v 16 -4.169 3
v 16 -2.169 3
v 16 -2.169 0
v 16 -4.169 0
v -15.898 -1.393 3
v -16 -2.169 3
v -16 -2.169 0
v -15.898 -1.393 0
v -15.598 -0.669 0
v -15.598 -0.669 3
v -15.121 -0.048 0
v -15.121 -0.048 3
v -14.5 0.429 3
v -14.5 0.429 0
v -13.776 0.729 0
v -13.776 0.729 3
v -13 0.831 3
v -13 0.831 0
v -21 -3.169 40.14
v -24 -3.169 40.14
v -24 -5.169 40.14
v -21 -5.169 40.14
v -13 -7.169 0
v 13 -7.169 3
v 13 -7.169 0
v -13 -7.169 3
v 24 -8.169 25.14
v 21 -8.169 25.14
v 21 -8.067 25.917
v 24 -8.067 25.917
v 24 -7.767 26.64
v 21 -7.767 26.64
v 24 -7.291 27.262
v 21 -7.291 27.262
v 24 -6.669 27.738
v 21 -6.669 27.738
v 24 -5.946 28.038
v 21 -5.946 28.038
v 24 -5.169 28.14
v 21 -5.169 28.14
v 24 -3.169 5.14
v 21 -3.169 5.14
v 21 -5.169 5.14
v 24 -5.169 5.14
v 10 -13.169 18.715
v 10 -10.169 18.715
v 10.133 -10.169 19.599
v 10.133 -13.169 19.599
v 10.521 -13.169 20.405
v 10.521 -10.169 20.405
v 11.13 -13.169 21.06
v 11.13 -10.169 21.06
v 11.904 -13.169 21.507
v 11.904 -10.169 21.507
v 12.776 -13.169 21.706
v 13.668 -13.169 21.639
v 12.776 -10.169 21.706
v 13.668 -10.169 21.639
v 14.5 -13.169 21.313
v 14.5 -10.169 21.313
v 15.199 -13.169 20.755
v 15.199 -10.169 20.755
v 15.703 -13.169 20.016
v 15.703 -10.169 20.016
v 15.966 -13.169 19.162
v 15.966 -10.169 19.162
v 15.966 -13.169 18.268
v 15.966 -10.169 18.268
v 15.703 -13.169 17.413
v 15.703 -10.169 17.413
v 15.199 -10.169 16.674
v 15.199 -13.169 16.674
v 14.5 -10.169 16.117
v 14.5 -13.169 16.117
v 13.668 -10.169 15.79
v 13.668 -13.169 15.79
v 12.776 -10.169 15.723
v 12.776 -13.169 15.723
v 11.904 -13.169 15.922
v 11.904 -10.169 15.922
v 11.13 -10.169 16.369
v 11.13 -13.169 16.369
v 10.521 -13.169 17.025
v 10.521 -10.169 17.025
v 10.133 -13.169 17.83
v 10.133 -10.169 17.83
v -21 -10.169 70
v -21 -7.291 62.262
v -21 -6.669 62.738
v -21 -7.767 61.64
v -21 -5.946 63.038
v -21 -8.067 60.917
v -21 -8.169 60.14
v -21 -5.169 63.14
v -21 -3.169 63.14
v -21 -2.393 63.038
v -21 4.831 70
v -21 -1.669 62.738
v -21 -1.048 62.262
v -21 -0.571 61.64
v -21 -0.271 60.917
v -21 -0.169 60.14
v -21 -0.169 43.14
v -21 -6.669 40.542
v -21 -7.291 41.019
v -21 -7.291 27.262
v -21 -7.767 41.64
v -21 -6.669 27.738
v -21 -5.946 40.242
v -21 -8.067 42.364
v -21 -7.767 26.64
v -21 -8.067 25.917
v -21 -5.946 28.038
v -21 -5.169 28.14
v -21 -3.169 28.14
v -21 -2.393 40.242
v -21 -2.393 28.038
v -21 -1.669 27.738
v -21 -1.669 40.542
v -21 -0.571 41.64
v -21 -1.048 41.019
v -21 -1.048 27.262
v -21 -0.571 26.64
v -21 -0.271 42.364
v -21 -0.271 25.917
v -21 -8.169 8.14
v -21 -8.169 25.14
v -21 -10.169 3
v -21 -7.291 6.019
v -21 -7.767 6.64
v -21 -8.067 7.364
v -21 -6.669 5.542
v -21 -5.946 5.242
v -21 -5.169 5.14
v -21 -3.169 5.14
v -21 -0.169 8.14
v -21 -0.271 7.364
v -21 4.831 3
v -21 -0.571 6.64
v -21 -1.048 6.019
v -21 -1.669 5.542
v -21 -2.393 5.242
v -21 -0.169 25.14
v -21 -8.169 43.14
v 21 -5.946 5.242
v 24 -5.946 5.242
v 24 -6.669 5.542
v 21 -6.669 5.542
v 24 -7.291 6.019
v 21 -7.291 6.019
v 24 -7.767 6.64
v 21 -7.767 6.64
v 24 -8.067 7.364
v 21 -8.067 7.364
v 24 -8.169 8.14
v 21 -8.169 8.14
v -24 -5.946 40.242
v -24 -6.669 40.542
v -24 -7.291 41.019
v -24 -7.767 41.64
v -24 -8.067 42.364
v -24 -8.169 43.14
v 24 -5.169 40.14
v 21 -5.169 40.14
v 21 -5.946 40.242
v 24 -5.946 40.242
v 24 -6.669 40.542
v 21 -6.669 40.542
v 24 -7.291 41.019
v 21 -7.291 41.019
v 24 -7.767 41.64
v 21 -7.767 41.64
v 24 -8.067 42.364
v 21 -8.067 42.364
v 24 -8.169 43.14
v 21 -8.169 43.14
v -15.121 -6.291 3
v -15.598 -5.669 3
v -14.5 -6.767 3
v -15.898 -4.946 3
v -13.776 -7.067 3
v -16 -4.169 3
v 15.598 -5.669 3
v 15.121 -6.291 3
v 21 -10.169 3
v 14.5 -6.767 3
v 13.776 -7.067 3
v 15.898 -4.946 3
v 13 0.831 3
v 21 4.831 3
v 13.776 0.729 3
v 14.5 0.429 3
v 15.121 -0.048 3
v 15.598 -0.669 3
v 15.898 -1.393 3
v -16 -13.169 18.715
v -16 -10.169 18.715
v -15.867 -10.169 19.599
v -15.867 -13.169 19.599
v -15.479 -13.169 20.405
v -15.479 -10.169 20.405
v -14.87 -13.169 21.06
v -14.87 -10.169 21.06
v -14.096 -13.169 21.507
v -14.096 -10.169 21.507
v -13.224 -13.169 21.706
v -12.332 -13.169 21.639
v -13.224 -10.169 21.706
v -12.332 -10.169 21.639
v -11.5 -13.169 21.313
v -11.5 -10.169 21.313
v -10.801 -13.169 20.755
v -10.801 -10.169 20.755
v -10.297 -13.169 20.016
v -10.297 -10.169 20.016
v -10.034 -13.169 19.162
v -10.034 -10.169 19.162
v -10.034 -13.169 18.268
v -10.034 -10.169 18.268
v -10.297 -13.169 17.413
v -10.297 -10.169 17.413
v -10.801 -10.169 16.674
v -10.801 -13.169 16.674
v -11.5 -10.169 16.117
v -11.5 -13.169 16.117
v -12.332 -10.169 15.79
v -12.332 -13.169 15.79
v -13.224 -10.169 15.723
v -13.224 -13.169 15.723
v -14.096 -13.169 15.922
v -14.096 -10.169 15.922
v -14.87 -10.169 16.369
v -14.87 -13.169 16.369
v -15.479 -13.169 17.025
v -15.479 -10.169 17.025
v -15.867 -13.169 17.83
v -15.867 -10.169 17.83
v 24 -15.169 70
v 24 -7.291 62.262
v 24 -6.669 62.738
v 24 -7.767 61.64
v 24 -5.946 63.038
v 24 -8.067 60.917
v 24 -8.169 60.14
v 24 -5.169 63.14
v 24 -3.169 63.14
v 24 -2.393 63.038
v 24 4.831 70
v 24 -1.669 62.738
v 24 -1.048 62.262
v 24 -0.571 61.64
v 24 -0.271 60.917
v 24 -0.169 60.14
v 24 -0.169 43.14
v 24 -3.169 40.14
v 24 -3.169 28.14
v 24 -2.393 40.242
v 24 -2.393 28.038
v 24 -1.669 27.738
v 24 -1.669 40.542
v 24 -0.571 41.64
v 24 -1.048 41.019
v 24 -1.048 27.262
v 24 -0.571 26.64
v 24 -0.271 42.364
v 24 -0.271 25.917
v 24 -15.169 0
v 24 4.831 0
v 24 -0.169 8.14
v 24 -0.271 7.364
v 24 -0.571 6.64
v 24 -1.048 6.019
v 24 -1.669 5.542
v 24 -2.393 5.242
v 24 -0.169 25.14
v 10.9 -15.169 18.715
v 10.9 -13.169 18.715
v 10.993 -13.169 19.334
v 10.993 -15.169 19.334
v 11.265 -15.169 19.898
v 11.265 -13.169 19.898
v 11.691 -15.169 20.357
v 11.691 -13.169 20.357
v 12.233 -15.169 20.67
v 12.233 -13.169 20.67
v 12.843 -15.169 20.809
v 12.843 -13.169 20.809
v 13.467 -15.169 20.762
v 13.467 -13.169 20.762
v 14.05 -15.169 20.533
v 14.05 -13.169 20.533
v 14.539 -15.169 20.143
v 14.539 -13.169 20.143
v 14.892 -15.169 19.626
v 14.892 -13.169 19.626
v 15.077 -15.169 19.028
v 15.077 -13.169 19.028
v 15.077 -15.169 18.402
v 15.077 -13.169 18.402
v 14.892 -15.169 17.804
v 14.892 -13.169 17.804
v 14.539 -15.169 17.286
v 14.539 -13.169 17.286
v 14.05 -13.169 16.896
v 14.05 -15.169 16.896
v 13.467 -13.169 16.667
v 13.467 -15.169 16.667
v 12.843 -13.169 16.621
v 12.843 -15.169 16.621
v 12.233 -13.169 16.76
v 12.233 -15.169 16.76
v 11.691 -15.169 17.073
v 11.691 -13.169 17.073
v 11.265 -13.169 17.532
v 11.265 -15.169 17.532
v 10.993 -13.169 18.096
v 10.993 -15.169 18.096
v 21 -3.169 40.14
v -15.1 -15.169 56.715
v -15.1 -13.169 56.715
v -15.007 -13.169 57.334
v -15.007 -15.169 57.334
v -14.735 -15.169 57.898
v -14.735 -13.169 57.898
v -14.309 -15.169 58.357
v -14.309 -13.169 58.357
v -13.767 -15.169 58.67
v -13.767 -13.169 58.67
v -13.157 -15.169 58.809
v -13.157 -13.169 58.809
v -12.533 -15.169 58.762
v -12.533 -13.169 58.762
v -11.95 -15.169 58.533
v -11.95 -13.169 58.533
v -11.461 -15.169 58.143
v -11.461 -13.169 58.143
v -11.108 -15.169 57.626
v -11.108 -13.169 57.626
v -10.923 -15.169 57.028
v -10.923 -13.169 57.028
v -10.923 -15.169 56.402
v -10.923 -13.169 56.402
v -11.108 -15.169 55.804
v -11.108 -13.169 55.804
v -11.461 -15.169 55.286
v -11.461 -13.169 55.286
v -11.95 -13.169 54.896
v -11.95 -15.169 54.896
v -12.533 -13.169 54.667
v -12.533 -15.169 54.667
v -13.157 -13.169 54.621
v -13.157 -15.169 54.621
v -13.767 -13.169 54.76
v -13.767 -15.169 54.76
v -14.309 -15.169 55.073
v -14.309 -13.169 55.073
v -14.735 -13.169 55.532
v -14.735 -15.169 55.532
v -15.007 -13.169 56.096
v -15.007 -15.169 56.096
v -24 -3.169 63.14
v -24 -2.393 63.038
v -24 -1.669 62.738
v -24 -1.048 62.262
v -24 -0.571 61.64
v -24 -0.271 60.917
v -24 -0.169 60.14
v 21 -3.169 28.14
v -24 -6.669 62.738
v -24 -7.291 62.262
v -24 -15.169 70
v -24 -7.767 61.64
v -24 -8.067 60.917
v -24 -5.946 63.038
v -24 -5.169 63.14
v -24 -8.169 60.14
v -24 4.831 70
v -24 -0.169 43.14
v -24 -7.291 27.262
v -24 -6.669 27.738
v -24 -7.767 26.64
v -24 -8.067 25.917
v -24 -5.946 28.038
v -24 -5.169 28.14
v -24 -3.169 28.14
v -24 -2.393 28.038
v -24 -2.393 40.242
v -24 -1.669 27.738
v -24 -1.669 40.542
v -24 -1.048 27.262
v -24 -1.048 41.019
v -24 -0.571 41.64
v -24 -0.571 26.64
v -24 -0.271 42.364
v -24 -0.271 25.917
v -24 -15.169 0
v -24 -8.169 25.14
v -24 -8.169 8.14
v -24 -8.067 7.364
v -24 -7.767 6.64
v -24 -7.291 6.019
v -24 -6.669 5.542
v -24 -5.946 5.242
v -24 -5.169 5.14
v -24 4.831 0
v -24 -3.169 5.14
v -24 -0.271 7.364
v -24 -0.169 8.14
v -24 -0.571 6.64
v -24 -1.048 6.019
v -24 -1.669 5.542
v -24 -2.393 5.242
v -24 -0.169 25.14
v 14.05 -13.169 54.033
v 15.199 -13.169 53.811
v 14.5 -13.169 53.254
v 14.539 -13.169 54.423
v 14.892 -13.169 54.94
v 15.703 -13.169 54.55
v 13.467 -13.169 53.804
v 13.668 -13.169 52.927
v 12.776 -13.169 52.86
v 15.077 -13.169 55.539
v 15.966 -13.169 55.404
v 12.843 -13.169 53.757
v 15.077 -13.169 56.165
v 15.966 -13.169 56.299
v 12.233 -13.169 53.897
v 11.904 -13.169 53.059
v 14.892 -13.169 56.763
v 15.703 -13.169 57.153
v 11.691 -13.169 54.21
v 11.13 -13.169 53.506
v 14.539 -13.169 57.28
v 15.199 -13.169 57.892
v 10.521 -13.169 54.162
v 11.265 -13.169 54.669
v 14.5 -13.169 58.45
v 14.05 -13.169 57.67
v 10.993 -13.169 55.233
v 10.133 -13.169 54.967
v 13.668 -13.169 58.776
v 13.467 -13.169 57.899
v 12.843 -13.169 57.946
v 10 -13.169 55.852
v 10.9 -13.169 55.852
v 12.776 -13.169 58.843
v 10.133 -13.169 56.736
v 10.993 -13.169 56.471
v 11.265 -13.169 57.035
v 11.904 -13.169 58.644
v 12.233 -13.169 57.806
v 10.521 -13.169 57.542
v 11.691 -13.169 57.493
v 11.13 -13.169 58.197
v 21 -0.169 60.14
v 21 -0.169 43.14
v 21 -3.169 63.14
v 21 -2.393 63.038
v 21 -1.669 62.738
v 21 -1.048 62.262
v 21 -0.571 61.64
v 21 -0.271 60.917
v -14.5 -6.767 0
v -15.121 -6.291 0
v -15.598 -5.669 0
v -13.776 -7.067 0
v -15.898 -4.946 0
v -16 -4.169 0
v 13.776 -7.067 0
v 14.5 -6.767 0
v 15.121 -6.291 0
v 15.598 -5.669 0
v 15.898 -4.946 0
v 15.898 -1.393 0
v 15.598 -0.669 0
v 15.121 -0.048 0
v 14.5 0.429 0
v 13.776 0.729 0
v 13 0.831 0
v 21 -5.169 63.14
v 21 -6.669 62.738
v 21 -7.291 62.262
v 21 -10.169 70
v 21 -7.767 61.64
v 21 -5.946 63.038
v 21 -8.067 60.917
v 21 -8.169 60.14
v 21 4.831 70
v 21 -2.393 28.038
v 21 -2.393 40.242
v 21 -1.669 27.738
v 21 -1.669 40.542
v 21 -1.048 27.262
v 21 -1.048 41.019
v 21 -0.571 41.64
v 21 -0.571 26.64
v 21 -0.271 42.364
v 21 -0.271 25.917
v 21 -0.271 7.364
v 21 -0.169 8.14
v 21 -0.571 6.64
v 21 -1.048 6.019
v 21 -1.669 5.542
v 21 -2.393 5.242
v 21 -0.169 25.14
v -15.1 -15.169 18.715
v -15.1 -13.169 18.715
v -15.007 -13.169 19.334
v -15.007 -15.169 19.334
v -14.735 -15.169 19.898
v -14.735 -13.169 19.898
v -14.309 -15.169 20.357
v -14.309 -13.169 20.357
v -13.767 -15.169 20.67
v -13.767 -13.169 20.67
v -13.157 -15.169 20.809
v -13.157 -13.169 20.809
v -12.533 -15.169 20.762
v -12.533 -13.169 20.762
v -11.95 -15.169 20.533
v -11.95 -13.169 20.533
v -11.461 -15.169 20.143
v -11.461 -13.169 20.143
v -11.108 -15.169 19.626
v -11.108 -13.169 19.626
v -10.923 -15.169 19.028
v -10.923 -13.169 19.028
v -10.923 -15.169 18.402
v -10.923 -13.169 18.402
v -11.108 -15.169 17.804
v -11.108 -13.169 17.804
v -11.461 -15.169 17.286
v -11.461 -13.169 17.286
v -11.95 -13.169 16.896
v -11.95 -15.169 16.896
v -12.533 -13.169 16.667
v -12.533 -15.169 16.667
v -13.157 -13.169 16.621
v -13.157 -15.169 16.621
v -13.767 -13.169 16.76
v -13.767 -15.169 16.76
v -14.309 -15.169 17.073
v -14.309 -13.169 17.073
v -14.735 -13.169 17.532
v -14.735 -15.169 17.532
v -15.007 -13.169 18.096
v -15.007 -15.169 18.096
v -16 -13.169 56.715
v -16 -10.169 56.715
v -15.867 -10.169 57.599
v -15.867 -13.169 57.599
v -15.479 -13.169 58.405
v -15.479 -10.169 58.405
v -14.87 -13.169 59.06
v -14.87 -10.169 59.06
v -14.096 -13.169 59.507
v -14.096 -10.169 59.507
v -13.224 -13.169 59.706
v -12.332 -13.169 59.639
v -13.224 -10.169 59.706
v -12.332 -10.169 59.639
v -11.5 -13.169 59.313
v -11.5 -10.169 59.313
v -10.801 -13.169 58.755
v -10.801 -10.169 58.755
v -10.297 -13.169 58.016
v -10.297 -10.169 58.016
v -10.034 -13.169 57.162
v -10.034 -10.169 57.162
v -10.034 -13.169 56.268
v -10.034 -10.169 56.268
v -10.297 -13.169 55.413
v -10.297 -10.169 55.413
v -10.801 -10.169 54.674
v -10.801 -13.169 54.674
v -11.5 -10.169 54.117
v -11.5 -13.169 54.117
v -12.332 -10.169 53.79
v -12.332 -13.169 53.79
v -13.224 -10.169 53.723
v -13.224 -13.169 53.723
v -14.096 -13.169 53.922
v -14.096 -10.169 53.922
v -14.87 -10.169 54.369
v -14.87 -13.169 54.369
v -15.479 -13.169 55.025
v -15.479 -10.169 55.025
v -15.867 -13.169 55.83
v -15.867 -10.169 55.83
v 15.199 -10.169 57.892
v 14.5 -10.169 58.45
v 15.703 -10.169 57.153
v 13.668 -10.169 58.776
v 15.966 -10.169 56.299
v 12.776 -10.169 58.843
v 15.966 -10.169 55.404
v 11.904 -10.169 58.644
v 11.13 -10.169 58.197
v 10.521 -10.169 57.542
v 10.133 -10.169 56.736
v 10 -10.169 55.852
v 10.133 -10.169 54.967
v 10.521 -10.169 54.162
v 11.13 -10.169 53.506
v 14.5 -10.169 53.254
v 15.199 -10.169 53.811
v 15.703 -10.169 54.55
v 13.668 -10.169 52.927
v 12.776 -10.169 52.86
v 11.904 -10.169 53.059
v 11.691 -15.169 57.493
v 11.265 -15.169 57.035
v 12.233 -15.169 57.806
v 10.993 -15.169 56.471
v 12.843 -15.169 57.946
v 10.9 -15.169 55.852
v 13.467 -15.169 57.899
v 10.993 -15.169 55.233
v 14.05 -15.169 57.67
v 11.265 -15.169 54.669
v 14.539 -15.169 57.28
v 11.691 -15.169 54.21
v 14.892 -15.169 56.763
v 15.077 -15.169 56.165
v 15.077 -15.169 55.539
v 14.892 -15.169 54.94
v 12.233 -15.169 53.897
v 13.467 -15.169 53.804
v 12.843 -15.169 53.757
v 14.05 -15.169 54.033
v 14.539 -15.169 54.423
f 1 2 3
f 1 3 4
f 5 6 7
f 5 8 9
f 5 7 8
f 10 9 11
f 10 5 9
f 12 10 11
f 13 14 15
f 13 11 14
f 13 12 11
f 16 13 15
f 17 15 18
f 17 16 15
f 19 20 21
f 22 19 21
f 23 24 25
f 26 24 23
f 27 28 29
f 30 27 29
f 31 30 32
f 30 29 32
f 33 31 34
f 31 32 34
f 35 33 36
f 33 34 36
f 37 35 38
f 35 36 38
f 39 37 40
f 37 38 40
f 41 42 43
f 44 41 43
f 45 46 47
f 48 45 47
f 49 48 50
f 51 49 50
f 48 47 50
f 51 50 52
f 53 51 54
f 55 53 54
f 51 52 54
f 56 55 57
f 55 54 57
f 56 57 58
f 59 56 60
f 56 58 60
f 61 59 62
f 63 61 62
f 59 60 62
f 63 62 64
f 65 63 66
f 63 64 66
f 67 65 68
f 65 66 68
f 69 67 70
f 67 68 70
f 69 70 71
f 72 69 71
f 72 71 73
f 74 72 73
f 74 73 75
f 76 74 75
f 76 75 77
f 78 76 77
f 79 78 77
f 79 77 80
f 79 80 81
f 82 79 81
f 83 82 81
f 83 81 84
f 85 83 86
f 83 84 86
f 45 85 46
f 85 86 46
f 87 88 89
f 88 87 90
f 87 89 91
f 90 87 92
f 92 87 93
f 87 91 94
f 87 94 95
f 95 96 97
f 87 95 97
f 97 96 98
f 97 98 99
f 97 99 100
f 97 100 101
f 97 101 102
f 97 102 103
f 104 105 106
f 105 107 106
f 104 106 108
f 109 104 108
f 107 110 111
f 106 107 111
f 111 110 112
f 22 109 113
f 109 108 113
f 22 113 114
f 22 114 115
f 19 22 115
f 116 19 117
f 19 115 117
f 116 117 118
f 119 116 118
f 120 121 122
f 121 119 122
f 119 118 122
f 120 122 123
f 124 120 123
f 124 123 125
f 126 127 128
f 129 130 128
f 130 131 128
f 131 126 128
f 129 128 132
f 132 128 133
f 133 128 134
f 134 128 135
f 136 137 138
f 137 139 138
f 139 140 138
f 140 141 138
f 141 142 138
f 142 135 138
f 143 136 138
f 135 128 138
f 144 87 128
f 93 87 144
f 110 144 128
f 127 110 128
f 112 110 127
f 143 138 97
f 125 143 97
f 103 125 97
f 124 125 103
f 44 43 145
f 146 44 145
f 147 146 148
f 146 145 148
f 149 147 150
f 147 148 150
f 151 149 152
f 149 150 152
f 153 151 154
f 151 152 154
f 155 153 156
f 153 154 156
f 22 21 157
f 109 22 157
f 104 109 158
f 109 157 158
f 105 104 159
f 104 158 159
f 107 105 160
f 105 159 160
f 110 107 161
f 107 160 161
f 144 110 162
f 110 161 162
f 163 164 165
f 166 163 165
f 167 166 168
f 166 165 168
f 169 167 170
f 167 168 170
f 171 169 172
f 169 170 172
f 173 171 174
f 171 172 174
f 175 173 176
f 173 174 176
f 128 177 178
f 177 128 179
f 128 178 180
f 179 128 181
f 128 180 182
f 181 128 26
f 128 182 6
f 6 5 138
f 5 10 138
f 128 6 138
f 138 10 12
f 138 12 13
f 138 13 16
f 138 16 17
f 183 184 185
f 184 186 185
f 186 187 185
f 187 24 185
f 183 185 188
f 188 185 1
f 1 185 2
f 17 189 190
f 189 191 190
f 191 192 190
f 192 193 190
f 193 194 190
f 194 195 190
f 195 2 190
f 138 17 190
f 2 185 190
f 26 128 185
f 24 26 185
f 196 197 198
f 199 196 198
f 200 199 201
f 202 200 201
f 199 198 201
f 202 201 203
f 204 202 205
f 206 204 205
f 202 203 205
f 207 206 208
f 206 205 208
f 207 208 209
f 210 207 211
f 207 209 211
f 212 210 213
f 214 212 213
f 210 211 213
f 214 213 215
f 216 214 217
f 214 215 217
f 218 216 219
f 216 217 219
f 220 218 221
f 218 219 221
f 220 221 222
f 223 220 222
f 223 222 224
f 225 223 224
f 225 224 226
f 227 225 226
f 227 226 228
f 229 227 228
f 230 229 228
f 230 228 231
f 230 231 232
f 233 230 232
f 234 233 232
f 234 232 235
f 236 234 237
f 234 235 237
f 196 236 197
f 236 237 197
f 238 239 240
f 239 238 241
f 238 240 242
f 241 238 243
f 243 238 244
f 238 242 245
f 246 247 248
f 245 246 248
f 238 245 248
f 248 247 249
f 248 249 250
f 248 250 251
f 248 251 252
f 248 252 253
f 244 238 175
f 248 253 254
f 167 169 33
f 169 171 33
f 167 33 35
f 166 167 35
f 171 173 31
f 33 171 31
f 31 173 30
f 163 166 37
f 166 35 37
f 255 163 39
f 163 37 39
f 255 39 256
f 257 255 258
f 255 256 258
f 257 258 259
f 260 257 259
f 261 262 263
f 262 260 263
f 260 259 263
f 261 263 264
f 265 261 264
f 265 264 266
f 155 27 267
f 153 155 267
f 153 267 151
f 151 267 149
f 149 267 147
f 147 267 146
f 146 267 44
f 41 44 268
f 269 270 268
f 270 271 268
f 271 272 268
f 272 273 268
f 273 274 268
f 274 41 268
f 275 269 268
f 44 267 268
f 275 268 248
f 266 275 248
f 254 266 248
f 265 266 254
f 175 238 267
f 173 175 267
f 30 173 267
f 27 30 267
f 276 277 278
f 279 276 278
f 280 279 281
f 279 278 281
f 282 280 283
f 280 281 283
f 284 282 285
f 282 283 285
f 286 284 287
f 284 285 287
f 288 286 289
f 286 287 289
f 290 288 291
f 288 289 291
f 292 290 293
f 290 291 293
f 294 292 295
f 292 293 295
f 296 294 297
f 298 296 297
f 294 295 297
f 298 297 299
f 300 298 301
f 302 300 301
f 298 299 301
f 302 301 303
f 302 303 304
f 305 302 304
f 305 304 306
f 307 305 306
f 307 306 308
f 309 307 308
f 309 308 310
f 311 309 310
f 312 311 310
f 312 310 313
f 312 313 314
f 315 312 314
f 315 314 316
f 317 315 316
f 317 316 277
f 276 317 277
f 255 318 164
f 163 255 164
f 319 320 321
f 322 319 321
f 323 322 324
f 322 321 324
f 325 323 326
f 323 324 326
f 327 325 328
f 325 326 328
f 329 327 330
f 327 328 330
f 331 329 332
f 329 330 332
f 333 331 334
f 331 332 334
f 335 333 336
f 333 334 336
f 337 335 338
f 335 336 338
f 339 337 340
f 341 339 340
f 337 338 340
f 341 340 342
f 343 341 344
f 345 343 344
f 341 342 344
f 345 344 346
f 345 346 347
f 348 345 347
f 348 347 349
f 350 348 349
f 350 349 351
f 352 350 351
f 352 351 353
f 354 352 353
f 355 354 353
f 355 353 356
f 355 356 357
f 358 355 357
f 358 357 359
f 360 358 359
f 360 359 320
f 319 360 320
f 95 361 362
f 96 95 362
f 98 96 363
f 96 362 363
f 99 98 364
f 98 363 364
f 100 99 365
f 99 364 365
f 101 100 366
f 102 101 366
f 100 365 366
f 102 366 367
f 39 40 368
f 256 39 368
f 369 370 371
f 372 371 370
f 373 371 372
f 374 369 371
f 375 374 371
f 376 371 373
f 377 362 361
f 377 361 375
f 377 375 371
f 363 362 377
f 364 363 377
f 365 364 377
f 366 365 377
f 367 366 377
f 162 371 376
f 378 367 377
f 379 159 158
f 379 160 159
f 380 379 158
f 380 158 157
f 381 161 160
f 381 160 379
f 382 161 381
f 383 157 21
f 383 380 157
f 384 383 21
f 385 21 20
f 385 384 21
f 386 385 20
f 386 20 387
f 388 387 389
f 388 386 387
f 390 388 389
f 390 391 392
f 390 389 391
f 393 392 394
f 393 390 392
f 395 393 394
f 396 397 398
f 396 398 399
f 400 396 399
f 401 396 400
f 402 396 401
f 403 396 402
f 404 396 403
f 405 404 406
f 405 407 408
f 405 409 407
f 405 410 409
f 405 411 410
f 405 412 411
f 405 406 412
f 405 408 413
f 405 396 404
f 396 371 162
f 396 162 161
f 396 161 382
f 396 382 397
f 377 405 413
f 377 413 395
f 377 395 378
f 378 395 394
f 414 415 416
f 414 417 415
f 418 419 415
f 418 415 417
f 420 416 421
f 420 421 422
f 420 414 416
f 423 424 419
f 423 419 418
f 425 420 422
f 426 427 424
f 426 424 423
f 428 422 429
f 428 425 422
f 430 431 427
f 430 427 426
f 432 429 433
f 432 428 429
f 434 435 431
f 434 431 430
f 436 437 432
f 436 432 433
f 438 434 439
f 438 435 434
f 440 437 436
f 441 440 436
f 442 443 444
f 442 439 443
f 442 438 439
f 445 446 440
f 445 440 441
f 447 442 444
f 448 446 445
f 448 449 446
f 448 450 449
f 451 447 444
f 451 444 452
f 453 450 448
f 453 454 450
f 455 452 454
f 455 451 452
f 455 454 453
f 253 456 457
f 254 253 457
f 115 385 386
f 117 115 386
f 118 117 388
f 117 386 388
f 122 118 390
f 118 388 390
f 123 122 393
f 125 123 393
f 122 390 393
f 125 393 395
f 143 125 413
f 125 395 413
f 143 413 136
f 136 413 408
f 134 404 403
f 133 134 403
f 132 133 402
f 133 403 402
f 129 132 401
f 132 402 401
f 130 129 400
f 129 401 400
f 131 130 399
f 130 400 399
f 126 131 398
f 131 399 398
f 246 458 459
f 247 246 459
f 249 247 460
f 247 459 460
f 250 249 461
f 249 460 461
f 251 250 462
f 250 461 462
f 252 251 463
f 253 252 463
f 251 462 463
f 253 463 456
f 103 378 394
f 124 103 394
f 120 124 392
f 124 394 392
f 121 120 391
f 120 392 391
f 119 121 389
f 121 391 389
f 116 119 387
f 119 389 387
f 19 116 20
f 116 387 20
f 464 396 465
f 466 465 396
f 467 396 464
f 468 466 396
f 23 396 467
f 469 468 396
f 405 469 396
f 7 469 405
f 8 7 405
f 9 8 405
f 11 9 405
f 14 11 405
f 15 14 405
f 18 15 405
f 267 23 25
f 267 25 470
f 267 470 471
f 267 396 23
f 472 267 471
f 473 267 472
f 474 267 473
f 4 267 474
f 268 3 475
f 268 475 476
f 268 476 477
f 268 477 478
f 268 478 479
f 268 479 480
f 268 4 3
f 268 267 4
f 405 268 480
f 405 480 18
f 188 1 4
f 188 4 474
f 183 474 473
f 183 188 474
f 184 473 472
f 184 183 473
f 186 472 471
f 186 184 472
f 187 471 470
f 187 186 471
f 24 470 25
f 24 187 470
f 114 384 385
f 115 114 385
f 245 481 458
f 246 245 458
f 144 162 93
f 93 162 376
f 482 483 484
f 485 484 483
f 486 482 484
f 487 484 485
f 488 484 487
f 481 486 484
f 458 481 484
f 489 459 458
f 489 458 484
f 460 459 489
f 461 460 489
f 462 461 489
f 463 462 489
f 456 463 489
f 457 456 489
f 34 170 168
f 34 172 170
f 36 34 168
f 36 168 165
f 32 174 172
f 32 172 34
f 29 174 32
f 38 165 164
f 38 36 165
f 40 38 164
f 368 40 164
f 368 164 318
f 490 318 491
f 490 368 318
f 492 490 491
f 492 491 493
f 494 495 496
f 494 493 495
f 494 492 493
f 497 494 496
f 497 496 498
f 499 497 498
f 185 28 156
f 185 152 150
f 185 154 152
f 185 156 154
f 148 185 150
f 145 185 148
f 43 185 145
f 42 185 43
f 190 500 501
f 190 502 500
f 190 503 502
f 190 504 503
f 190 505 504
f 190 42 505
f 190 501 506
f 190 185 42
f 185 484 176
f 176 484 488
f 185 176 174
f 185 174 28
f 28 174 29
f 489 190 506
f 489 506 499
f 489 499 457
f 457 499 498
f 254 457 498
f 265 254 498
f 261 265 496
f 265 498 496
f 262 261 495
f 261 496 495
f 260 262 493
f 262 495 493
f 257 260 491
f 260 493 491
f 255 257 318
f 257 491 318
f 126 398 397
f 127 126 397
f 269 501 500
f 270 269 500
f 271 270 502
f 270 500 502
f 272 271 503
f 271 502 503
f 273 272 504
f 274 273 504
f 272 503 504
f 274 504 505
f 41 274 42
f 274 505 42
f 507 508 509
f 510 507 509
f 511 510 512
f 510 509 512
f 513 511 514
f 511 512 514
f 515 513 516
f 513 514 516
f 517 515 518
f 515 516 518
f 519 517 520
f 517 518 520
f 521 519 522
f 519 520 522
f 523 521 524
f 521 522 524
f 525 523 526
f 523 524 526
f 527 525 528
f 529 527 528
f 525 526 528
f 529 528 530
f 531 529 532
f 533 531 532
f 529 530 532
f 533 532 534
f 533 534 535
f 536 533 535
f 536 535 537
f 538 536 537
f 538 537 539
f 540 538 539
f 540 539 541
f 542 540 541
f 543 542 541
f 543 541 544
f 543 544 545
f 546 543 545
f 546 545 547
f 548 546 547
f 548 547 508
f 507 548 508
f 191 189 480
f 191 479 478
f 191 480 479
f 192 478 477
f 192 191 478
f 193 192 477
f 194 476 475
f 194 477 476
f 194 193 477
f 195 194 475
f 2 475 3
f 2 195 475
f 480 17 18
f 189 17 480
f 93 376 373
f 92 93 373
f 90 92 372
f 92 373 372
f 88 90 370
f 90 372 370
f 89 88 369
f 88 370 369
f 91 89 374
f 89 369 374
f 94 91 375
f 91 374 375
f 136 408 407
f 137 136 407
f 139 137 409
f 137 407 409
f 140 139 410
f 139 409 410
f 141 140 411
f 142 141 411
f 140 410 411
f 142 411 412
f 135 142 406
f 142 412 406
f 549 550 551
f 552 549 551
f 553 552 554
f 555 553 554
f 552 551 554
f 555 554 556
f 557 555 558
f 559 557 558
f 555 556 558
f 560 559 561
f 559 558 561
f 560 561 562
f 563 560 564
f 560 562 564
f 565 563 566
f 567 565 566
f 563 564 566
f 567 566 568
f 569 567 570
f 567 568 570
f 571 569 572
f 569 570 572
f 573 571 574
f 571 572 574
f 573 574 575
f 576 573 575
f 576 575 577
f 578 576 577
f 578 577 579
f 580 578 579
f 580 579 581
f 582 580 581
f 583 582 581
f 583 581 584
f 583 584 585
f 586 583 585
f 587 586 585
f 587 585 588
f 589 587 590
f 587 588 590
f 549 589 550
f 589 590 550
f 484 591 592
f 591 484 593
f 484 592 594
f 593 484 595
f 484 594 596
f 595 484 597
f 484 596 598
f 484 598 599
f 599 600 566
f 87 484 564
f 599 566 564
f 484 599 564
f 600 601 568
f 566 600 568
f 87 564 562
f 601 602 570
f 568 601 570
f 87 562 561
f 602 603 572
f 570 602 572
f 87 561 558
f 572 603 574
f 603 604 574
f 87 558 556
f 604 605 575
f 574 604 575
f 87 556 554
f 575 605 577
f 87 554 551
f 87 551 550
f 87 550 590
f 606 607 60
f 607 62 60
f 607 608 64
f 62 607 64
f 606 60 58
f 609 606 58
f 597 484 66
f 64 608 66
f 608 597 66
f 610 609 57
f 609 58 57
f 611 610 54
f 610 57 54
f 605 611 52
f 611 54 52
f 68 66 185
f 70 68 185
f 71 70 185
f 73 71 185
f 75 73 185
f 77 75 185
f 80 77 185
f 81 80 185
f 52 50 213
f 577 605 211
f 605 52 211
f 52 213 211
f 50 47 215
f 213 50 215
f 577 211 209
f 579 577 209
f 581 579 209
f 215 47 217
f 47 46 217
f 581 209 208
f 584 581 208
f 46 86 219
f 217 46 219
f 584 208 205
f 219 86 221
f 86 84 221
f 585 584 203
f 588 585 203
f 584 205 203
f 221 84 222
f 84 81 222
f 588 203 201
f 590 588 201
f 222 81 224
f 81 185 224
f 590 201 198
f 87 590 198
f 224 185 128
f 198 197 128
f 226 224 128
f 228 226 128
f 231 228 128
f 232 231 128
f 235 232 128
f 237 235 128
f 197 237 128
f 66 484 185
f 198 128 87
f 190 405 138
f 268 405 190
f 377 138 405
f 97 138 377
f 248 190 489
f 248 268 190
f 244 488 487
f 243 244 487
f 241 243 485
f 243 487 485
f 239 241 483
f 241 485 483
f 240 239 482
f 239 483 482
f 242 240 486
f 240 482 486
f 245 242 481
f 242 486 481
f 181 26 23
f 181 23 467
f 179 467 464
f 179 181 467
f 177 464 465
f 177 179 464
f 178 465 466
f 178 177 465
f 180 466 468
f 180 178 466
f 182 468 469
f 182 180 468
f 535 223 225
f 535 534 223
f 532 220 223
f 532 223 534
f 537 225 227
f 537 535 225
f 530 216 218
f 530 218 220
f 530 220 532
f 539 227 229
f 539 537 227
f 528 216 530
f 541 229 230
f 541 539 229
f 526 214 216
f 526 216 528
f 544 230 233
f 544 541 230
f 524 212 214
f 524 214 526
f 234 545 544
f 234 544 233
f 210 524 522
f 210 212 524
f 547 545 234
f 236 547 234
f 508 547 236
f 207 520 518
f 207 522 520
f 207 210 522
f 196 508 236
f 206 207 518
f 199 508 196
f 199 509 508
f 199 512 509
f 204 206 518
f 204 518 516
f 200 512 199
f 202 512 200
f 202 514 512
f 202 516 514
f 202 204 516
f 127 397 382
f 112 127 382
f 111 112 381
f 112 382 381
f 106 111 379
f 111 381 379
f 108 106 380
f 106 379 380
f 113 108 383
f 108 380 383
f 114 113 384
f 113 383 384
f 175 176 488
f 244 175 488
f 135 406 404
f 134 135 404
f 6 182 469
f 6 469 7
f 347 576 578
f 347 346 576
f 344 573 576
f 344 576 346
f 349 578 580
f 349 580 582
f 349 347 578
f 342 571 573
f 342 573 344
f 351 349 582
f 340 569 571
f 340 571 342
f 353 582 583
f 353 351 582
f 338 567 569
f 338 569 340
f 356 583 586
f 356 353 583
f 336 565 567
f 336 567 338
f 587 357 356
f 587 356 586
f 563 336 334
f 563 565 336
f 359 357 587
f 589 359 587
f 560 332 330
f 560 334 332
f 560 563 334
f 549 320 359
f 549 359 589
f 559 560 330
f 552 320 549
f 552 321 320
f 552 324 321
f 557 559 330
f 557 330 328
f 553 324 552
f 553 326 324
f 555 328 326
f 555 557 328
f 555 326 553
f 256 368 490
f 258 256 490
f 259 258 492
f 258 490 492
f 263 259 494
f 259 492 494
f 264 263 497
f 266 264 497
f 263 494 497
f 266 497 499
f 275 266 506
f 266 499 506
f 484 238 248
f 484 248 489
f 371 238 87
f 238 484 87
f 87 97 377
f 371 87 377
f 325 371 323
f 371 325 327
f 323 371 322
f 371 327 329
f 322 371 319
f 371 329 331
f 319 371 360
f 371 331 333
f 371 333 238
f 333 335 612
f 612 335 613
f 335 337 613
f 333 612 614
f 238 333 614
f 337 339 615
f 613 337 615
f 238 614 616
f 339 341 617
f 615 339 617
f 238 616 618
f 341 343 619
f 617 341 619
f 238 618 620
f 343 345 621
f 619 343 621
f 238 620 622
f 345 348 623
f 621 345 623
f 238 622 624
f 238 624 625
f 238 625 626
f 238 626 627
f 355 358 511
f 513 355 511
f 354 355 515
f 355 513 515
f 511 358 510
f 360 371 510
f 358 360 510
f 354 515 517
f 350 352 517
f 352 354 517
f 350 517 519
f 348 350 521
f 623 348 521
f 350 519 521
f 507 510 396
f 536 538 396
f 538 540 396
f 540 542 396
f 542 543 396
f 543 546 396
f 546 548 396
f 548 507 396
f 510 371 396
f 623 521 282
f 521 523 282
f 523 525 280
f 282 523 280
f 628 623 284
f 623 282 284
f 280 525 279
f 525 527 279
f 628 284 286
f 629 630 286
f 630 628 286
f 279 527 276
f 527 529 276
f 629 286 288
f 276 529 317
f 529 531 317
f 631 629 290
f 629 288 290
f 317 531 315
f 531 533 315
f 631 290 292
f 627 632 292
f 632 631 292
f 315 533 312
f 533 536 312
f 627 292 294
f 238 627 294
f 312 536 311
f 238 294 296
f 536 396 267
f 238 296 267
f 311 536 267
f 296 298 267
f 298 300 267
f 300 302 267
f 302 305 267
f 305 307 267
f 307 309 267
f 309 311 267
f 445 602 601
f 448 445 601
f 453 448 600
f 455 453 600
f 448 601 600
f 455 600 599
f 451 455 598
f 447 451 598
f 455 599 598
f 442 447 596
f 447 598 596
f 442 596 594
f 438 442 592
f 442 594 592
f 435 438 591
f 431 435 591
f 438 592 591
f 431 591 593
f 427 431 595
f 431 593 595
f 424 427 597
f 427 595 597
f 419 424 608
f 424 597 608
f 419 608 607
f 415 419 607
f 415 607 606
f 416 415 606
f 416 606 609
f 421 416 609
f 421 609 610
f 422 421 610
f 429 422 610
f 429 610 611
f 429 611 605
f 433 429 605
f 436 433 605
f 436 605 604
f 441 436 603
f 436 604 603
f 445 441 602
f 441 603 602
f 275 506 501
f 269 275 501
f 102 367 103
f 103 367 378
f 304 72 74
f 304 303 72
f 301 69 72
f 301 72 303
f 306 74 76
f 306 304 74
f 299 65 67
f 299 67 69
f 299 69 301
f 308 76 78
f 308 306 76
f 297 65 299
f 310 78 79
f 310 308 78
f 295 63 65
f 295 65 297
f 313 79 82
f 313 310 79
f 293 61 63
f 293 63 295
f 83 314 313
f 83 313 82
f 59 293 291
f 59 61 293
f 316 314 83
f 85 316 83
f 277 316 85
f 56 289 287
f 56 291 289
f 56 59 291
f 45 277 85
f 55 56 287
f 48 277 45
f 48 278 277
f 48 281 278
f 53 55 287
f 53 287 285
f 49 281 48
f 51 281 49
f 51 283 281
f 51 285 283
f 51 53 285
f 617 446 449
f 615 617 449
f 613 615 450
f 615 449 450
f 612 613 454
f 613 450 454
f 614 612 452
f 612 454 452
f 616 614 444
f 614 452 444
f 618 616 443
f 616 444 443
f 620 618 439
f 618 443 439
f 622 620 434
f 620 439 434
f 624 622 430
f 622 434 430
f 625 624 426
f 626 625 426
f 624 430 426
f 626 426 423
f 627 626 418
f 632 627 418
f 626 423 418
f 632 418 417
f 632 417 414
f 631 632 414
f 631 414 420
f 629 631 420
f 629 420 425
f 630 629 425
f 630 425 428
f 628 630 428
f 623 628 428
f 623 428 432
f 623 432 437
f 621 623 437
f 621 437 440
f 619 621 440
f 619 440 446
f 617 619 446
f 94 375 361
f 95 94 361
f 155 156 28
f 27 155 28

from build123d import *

# Parameters (mm, degrees)
EXTRUDE_1_DEPTH     = 70
SKETCH_2_W          = 3
SKETCH_2_H          = 15
EXTRUDE_2_DEPTH     = 70
EXTRUDE_3_REACH     = 86.588
SKETCH_3_W          = 3
SKETCH_3_H          = 15
CUT_EXTRUDE_1_DEPTH = 87.22126548
CUT_EXTRUDE_2_DEPTH = 73.767483267
SKETCH_6_R          = 3
CUT_EXTRUDE_3_DEPTH = 3
SKETCH_7_R          = 2.1
CUT_EXTRUDE_4_DEPTH = 77.157731059


with BuildPart() as part:
    # 草图1 → 凸台-拉伸1 (new body)
    with BuildSketch(Plane.XY):
        Polygon((0, -15.16926567), (-24, -15.16926567), (-24, -10.16926567), (0, -10.16926567), (24, -10.16926567), (24, -15.16926567), align=None)
    extrude(amount=EXTRUDE_1_DEPTH)

    # 草图2 → 凸台-拉伸2 (add)
    with BuildSketch(Plane(origin=(0, 0, 0), x_dir=(-1, 0, 0), z_dir=(0, 0, -1))):
        with Locations((-22.5, -2.66926567)):
            Rectangle(SKETCH_2_W, SKETCH_2_H)
        with Locations((22.5, -2.66926567)):
            Rectangle(SKETCH_2_W, SKETCH_2_H)
    extrude(amount=-EXTRUDE_2_DEPTH)

    # 草图3 → 凸台-拉伸3 (add, up to next)
    with BuildSketch(Plane.ZY.offset(-21), mode=Mode.PRIVATE) as extrude_3_sk1:
        with Locations((1.5, -2.66926567)):
            Rectangle(SKETCH_3_W, SKETCH_3_H)
    extrude_3_tool1 = extrude(extrude_3_sk1.sketch, amount=EXTRUDE_3_REACH, mode=Mode.PRIVATE) - part.part
    add(extrude_3_tool1.solids().sort_by_distance((21, -2.669266, 1.5))[0])

    # 草图4 → 切除-拉伸1 (cut, through all)
    with BuildSketch(Plane.ZY.offset(24)):
        with BuildLine():
            Line((5.140274164, -3.16926567), (5.140274164, -5.16926567))
            ThreePointArc((5.140274164, -5.16926567), (6.018953821, -7.290586014), (8.140274164, -8.16926567))
            Line((8.140274164, -8.16926567), (25.140274164, -8.16926567))
            ThreePointArc((25.140274164, -8.16926567), (27.261594508, -7.290586014), (28.140274164, -5.16926567))
            Line((28.140274164, -5.16926567), (28.140274164, -3.16926567))
            ThreePointArc((28.140274164, -3.16926567), (27.261594508, -1.047945327), (25.140274164, -0.16926567))
            Line((25.140274164, -0.16926567), (8.140274164, -0.16926567))
            ThreePointArc((8.140274164, -0.16926567), (6.018953821, -1.047945327), (5.140274164, -3.16926567))
        make_face()
        with BuildLine():
            Line((40.140274164, -3.16926567), (40.140274164, -5.16926567))
            ThreePointArc((40.140274164, -5.16926567), (41.018953821, -7.290586014), (43.140274164, -8.16926567))
            Line((43.140274164, -8.16926567), (60.140274164, -8.16926567))
            ThreePointArc((60.140274164, -8.16926567), (62.261594508, -7.290586014), (63.140274164, -5.16926567))
            Line((63.140274164, -5.16926567), (63.140274164, -3.16926567))
            ThreePointArc((63.140274164, -3.16926567), (62.261594508, -1.047945327), (60.140274164, -0.16926567))
            Line((60.140274164, -0.16926567), (43.140274164, -0.16926567))
            ThreePointArc((43.140274164, -0.16926567), (41.018953821, -1.047945327), (40.140274164, -3.16926567))
        make_face()
    extrude(amount=-CUT_EXTRUDE_1_DEPTH, mode=Mode.SUBTRACT)

    # 草图5 → 切除-拉伸2 (cut, through all)
    with BuildSketch(Plane.XY.offset(3)):
        with BuildLine():
            Line((-13, 0.83073433), (13, 0.83073433))
            ThreePointArc((13, 0.83073433), (15.121320344, -0.047945327), (16, -2.16926567))
            Line((16, -2.16926567), (16, -4.16926567))
            ThreePointArc((16, -4.16926567), (15.121320344, -6.290586014), (13, -7.16926567))
            Line((13, -7.16926567), (-13, -7.16926567))
            ThreePointArc((-13, -7.16926567), (-15.121320344, -6.290586014), (-16, -4.16926567))
            Line((-16, -4.16926567), (-16, -2.16926567))
            ThreePointArc((-16, -2.16926567), (-15.121320344, -0.047945327), (-13, 0.83073433))
        make_face()
    extrude(amount=-CUT_EXTRUDE_2_DEPTH, mode=Mode.SUBTRACT)

    # 草图6 → 切除-拉伸3 (cut)
    with BuildSketch(Plane(origin=(0, -10.16926567, 0), x_dir=(1, 0, 0), z_dir=(0, 1, 0))):
        with Locations(Location((-13, -18.714712401, 0), (0, 0, 180))):
            Circle(SKETCH_6_R)
        with Locations(Location((13, -18.714712401, 0), (0, 0, 180))):
            Circle(SKETCH_6_R)
        with Locations(Location((-13, -56.714712401, 0), (0, 0, 180))):
            Circle(SKETCH_6_R)
        with Locations(Location((13, -55.851588753, 0), (0, 0, 180))):
            Circle(SKETCH_6_R)
    extrude(amount=-CUT_EXTRUDE_3_DEPTH, mode=Mode.SUBTRACT)

    # 草图7 → 切除-拉伸4 (cut, through all)
    with BuildSketch(Plane(origin=(0, -13.16926567, 0), x_dir=(1, 0, 0), z_dir=(0, 1, 0))):
        with Locations(Location((-13, -18.714712401, 0), (0, 0, 180))):
            Circle(SKETCH_7_R)
        with Locations(Location((13, -18.714712401, 0), (0, 0, 180))):
            Circle(SKETCH_7_R)
        with Locations(Location((13, -55.851588753, 0), (0, 0, 180))):
            Circle(SKETCH_7_R)
        with Locations(Location((-13, -56.714712401, 0), (0, 0, 180))):
            Circle(SKETCH_7_R)
    extrude(amount=-CUT_EXTRUDE_4_DEPTH, mode=Mode.SUBTRACT)


solid = part.part
